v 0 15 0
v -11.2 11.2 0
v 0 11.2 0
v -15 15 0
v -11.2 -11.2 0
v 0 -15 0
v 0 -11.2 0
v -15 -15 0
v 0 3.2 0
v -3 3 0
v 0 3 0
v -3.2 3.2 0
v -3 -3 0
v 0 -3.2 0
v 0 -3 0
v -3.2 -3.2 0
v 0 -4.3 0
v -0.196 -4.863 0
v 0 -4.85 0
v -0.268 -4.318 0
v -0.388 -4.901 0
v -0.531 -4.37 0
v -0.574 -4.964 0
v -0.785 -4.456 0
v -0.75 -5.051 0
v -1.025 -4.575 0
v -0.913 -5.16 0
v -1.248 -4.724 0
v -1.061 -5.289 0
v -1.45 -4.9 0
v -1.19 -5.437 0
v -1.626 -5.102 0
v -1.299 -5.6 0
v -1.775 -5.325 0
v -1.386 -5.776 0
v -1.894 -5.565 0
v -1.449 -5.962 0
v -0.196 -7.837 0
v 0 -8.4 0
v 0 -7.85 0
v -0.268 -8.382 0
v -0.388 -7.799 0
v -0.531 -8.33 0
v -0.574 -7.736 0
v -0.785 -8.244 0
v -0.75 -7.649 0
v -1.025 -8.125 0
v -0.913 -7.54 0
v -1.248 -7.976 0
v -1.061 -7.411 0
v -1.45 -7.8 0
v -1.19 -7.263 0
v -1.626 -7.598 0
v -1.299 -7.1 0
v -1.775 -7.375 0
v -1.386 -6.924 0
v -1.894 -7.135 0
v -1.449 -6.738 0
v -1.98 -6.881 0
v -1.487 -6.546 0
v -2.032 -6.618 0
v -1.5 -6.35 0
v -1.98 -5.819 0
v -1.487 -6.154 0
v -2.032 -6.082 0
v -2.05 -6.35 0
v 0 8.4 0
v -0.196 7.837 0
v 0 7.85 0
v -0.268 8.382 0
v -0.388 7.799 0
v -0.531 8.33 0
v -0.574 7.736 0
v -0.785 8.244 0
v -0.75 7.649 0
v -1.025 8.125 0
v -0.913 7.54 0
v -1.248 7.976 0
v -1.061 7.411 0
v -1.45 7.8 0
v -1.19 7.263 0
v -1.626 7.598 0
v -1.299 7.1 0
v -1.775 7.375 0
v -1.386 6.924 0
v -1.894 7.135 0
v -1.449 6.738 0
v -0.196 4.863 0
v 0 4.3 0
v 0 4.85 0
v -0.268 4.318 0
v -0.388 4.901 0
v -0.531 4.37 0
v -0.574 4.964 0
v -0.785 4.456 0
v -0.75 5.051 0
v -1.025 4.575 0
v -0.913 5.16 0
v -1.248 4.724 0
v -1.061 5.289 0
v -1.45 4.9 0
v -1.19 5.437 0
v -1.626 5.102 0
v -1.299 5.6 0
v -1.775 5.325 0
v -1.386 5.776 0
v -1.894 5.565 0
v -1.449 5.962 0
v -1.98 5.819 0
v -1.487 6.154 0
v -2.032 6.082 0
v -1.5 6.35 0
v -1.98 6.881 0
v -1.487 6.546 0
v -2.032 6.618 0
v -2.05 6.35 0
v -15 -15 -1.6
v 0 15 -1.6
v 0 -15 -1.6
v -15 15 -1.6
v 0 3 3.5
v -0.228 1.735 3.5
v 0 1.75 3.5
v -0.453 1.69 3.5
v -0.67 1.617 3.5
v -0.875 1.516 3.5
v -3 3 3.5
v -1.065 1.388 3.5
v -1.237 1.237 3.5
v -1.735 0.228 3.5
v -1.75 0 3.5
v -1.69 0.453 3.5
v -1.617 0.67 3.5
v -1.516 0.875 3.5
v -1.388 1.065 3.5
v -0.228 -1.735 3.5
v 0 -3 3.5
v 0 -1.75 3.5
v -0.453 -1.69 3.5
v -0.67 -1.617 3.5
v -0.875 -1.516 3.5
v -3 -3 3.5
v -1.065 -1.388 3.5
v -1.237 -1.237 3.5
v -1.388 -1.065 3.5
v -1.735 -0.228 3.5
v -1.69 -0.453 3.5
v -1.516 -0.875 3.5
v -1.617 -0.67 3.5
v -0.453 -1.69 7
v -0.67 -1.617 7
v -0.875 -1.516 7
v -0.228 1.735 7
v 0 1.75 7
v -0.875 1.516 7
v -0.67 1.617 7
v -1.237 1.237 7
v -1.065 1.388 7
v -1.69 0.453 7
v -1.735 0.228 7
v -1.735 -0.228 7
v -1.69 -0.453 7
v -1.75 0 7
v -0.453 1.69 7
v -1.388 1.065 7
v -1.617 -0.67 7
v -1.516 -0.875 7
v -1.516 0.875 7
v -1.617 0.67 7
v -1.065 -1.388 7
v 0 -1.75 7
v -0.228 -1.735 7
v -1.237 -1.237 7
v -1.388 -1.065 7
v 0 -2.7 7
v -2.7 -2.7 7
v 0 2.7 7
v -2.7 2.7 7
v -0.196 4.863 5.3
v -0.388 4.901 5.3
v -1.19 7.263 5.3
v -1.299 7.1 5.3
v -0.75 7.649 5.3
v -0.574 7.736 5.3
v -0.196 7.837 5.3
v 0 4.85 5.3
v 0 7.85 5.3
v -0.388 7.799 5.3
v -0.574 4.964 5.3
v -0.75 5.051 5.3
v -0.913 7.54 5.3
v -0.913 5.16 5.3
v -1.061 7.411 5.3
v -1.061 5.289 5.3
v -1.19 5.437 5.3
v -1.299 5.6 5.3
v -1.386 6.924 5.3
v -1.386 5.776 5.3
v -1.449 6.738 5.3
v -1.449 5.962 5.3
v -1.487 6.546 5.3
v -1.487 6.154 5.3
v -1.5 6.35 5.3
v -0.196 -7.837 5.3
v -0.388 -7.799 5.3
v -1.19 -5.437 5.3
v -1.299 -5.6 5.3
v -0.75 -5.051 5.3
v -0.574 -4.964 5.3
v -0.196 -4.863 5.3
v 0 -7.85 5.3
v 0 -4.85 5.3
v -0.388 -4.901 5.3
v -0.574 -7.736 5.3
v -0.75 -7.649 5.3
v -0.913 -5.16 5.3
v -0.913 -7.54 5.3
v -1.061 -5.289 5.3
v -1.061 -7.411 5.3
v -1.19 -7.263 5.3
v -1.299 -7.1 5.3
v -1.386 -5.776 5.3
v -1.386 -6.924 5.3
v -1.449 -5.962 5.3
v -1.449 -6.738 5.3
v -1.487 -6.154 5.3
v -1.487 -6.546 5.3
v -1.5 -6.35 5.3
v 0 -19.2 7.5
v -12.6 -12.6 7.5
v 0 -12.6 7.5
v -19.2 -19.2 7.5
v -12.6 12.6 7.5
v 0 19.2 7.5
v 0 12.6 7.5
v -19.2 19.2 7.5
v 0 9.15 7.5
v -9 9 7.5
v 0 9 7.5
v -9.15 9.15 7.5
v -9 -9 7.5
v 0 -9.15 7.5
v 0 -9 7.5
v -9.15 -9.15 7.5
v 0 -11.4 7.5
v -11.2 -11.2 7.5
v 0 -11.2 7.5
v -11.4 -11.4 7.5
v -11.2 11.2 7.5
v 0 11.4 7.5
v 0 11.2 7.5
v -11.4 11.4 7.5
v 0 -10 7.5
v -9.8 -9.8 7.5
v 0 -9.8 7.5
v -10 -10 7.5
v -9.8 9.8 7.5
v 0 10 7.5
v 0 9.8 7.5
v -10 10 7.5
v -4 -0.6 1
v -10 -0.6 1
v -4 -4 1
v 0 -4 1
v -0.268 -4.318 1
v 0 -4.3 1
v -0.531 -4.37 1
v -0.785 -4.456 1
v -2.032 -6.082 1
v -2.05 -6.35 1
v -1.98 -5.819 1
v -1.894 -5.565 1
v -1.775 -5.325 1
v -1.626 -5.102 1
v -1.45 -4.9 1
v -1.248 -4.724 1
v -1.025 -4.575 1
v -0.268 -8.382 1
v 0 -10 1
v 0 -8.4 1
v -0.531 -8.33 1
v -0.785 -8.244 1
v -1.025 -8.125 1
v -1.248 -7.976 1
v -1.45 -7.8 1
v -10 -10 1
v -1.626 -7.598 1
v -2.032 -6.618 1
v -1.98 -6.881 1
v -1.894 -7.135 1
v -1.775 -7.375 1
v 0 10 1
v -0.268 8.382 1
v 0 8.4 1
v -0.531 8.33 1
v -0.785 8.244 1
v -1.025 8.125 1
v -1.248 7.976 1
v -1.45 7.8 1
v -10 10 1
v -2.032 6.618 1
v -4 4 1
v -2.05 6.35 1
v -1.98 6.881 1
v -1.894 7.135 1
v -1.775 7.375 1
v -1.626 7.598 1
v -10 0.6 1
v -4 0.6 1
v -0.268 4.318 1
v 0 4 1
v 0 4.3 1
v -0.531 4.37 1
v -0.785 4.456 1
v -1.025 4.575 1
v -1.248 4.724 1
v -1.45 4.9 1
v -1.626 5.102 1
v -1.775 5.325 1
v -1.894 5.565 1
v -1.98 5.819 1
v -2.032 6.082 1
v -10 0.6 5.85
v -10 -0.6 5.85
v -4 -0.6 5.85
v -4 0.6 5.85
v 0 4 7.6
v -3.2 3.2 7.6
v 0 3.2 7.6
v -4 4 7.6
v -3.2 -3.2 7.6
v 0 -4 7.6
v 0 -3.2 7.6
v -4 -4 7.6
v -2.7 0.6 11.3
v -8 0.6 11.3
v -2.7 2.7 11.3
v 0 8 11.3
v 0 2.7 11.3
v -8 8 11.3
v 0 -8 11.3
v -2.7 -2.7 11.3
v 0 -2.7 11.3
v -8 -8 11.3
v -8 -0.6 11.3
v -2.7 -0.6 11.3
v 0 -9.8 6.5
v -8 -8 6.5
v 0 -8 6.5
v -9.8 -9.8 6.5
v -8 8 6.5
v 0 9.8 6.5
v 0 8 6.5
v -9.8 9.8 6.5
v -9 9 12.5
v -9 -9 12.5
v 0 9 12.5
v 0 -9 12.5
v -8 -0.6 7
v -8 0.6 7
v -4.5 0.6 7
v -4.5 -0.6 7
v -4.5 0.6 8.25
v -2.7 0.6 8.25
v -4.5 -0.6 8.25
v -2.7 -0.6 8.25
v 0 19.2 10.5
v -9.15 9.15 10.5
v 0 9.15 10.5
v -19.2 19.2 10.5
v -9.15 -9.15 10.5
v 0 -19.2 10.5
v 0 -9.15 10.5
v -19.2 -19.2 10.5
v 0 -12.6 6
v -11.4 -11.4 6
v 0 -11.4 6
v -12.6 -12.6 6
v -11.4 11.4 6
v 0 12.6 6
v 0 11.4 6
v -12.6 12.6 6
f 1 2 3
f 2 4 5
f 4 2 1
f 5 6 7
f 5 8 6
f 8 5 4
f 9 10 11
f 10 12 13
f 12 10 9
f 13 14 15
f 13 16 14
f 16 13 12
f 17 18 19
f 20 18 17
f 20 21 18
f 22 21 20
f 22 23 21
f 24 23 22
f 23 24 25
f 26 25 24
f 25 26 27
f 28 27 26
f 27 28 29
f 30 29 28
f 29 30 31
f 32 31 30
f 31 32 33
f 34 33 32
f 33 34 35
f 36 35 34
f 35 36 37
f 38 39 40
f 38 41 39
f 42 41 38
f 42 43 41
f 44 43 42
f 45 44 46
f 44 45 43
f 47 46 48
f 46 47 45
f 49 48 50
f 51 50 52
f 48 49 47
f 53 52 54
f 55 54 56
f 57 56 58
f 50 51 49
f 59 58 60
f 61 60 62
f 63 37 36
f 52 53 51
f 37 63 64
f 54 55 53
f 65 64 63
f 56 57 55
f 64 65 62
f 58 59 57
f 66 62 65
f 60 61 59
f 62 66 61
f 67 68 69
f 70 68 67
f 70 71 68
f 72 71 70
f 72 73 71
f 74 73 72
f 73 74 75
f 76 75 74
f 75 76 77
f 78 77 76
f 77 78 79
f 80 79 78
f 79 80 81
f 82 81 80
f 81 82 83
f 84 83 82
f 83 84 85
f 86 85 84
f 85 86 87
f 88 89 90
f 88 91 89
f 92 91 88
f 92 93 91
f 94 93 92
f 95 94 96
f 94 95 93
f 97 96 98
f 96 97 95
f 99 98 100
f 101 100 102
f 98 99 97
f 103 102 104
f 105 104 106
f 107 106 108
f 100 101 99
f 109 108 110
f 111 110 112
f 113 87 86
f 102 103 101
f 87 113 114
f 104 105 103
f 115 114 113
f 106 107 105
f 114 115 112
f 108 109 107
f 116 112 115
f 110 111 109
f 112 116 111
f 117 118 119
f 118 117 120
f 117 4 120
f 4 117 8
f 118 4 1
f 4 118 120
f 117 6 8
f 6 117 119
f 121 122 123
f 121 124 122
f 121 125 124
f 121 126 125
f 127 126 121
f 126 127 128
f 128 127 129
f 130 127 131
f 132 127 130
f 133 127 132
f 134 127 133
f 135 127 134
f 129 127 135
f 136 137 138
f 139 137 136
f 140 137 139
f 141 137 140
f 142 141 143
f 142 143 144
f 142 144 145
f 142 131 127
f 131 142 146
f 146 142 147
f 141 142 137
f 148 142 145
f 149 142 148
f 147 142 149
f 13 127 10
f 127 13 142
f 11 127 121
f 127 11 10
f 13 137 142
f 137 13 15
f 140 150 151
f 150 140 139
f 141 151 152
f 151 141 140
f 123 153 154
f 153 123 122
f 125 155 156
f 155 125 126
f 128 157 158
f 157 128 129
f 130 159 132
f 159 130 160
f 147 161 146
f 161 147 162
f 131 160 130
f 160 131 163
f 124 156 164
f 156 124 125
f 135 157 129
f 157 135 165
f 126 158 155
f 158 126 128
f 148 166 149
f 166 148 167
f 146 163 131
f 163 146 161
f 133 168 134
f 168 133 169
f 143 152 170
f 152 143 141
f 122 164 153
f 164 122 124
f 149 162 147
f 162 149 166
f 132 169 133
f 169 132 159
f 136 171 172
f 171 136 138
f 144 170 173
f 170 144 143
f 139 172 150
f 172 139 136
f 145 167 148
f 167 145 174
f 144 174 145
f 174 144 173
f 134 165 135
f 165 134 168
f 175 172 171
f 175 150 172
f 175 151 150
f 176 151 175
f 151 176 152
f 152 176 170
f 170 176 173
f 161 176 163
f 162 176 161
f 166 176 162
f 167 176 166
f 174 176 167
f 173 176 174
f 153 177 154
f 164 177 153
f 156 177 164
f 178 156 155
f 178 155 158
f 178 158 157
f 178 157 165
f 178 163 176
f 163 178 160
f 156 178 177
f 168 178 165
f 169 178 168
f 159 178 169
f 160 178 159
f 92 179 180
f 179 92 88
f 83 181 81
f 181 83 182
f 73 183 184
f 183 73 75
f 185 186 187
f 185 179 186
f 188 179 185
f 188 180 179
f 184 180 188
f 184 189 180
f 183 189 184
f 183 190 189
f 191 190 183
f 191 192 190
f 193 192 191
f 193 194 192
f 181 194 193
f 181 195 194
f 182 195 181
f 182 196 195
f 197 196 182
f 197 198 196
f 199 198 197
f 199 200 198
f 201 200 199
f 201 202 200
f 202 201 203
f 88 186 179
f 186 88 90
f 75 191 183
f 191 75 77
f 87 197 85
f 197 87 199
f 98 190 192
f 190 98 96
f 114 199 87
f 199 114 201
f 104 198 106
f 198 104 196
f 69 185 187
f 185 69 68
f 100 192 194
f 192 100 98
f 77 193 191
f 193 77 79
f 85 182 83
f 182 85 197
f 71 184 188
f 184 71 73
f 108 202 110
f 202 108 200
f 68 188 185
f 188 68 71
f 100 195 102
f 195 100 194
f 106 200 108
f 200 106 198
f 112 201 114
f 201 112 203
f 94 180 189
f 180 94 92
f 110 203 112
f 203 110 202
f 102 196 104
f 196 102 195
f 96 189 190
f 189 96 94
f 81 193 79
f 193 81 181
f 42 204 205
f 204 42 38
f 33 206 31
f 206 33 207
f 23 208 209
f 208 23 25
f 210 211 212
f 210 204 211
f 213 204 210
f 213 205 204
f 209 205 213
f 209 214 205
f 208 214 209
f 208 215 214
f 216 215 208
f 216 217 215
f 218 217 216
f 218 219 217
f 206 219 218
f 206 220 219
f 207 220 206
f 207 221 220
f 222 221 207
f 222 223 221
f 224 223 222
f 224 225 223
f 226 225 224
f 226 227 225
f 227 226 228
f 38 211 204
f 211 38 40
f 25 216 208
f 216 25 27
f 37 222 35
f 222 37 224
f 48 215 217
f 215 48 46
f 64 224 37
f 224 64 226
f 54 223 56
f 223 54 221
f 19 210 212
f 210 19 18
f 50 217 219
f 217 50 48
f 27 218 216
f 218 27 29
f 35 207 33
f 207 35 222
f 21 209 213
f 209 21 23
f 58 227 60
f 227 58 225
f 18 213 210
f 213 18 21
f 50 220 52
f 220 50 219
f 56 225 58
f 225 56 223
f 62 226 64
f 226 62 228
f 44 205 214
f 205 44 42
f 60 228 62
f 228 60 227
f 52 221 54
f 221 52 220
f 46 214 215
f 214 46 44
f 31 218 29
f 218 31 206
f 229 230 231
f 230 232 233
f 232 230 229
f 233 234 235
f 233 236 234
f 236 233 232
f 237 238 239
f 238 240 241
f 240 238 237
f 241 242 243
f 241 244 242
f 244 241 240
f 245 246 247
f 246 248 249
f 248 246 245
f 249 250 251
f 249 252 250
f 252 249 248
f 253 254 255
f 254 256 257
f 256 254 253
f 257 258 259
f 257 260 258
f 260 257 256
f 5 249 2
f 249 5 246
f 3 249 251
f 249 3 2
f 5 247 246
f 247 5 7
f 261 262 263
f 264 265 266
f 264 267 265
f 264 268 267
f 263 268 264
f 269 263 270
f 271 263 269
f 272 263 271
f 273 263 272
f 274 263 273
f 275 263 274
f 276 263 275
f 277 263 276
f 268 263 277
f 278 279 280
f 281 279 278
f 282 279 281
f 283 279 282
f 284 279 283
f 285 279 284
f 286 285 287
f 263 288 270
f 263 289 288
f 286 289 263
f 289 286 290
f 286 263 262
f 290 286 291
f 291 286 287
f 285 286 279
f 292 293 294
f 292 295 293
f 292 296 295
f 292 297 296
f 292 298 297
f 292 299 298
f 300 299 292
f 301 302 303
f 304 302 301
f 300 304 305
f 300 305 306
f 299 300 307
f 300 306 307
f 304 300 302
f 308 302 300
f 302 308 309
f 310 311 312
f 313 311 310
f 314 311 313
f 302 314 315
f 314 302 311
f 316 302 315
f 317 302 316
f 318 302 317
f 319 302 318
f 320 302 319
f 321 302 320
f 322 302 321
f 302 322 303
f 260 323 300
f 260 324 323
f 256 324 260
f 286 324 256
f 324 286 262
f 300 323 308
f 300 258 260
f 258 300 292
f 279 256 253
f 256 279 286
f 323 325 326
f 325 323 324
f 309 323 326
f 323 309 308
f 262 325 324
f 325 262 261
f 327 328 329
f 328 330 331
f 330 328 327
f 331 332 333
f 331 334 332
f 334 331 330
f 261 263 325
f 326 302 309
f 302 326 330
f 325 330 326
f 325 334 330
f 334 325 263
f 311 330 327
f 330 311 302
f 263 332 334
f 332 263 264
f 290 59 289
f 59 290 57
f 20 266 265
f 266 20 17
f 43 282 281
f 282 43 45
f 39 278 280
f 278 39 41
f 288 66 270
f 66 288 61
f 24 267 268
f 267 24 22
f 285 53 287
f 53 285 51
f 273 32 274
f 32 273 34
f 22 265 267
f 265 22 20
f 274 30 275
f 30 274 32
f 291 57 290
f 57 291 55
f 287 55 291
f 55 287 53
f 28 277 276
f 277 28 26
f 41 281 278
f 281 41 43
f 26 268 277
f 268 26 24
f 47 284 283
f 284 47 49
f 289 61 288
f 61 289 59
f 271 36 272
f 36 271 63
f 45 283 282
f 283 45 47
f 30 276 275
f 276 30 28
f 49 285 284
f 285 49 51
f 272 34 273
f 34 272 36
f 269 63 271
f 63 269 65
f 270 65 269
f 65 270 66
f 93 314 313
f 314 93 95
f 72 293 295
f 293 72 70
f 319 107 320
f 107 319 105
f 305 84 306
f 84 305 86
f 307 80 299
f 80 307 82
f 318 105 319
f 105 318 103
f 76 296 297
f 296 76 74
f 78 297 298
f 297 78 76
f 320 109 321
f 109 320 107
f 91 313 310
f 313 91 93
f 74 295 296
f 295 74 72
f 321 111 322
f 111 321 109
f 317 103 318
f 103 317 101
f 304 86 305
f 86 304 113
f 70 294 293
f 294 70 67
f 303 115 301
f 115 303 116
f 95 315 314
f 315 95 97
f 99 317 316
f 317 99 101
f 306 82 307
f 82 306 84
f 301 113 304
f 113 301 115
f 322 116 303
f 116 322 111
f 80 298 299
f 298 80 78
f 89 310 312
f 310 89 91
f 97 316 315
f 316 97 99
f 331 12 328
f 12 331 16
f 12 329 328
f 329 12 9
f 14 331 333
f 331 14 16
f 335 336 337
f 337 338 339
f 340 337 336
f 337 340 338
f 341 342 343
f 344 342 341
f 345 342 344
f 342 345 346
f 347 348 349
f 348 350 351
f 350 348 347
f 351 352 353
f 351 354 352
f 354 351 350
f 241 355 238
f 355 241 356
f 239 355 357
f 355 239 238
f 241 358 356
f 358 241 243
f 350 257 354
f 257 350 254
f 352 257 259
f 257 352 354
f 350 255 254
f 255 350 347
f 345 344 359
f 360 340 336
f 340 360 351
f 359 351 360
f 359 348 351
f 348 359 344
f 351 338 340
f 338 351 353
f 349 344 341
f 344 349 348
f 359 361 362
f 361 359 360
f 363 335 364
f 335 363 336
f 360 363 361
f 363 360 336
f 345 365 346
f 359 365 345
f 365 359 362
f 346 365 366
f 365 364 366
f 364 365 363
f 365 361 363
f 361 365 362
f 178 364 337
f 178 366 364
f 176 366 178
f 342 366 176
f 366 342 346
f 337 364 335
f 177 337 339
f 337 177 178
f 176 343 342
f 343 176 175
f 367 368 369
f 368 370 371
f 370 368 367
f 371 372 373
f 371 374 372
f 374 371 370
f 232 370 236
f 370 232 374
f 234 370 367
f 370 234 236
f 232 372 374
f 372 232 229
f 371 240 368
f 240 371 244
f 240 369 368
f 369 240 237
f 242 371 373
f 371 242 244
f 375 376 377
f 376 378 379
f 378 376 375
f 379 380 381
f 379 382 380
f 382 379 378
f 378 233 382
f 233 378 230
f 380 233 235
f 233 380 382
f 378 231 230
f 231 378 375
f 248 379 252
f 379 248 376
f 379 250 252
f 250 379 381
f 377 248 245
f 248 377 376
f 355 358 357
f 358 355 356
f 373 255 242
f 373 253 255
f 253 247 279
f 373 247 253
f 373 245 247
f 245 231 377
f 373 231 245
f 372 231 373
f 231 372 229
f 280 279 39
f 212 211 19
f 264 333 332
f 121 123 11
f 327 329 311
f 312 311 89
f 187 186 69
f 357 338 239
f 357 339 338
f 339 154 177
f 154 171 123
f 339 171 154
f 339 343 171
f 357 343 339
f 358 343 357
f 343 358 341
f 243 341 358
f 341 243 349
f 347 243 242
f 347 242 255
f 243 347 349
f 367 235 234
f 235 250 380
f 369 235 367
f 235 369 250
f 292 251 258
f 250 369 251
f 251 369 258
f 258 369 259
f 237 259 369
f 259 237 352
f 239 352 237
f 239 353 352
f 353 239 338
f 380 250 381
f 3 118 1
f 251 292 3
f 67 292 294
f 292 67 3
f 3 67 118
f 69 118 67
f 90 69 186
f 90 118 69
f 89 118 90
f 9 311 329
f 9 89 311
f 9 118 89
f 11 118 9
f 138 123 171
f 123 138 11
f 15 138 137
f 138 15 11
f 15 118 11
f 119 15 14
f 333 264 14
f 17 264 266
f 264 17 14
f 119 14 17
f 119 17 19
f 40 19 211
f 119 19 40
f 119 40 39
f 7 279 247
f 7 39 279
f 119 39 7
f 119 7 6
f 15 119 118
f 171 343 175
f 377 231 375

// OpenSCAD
// Parametric DIY Korry-style pushbutton
//   1 x 6x6 mm THT tactile switch (centre)
//   2 x 3 mm THT LEDs (upper zone / lower zone)
//   printed holder (sits on PCB) + printed cap (slides through panel hole)
//
// Stack, z = 0 at PCB top surface:
//   PCB -> holder (light chambers, switch collar) -> panel back
//   cap flange is trapped between holder sleeve and panel back,
//   tactile switch dome pushes the cap back up.
//
// Render one part at a time:  openscad -D 'part="cap"' -o cap.stl korry.scad
// part = "cap" | "holder" | "coupon" | "assembly" | "section"

part = "section";

/* ---------- parameters you will tune ---------- */
cap_w        = 18.0;   // visible cap face, square
cap_clear    = 0.15;   // per side, cap <-> panel hole
protrude     = 2.0;    // cap face above panel front at rest
panel_t      = 3.0;    // front panel thickness
face_t       = 1.2;    // translucent face (print in white/natural)
wall         = 1.0;    // cap skirt wall
flange       = 0.8;    // flange width beyond skirt (stops cap)
flange_t     = 1.0;
divider_t    = 1.2;

sw_body      = 6.0;    // tactile switch body (square)
sw_body_h    = 3.5;    // body height above PCB
sw_h         = 7.0;    // plunger top above PCB (buy 6x6x7)
sw_travel    = 0.25;   // datasheet travel
plunger_gap  = 0.0;    // + = gap at rest (rattle), - = preload. Print -0.1/0/+0.1 and pick

led_d        = 3.0;
led_flange_d = 3.9;
led_y        = 6.35;   // 2.5 x 0.1" from centre -> perfboard friendly
diffuse_gap  = 6.0;    // min distance LED top -> face underside (even glow)
led_h        = 5.3;    // 3 mm LED height above PCB

holder_base  = 1.0;
holder_wall  = 1.2;
fit          = 0.2;    // generic sliding clearance

$fn = 48;

/* ---------- derived ---------- */
skirt_w   = cap_w;                       // skirt = face size, passes through panel hole
flange_w  = cap_w + 2*flange;
hole_w    = cap_w + 2*cap_clear;         // panel hole
sleeve_in = flange_w + 2*fit;
holder_w  = sleeve_in + 2*holder_wall;

face_under = max(led_h + diffuse_gap, 0);  // z of face underside at rest
cap_top    = face_under + face_t;
panel_front= cap_top - protrude;
panel_back = panel_front - panel_t;        // == holder height == flange top at rest
cap_bottom = panel_back - flange_t;        // skirt / flange bottom
piston_w   = sw_body - 0.6;                // presses plunger, runs inside collar
piston_bot = sw_h + plunger_gap;
collar_in  = sw_body + 2*fit;
collar_out = collar_in + 2*0.8;          // 2 perimeters @ 0.4 nozzle
collar_top = piston_bot + 0.6;             // piston dips 0.6 into collar = light labyrinth
holder_div_top = min(piston_bot, cap_bottom) - sw_travel - 0.4; // below cap skirt + divider when pressed
notch_z    = collar_top + sw_travel + 0.4; // divider relief above collar

assert(holder_div_top > led_h - 2, "holder divider too low to separate LEDs - raise diffuse_gap");
assert(notch_z < face_under - 1, "divider relief reaches the face - raise diffuse_gap");
assert(led_y - led_flange_d/2 > collar_out/2 + 0.2, "LED collides with switch collar");
assert(led_y + led_flange_d/2 < sleeve_in/2, "LED outside chamber");

echo(str("panel hole = ", hole_w, " mm square"));
echo(str("holder / standoff height (PCB top -> panel back) = ", panel_back, " mm"));
echo(str("cap total height = ", cap_top - cap_bottom, " mm"));

module sq(w, h, z=0) translate([-w/2, -w/2, z]) cube([w, w, h]);

/* ---------- CAP (print face-down: face in white/natural, rest black) ---------- */
module cap() {
    difference() {
        union() {
            sq(skirt_w, face_under - cap_bottom, cap_bottom); // skirt (face is separate body)
            sq(flange_w, flange_t, cap_bottom);              // flange
        }
        sq(skirt_w - 2*wall, face_under - cap_bottom + 0.01, cap_bottom - 0.01);
    }
    // divider (black) splits upper / lower legend zones
    difference() {
        translate([-skirt_w/2 + 0.01, -divider_t/2, piston_bot])
            cube([skirt_w - 0.02, divider_t, face_under - piston_bot + 0.01]);
        // relief over the switch collar
        translate([-collar_out/2 - 0.5, -divider_t, piston_bot - 0.1])
            cube([collar_out + 1, 2*divider_t, notch_z - piston_bot + 0.1]);
    }
    // piston: presses the plunger, nests in collar to block light crossing over
    sq(piston_w, face_under - piston_bot + 0.01, piston_bot);
}

/* ---------- FACE ONLY (separate body for AMS colour assignment) ---------- */
module cap_face() sq(skirt_w, face_t, face_under);

/* ---------- HOLDER (print black, sits on PCB) ---------- */
module holder() {
    difference() {
        union() {
            // sleeve
            difference() {
                sq(holder_w, panel_back);
                sq(sleeve_in, panel_back + 1, holder_base);
            }
            // switch collar
            sq(collar_out, collar_top);
            // horizontal light divider either side of the collar
            for (s = [-1, 1])
                translate([s > 0 ? collar_out/2 - 0.01 : -sleeve_in/2, -divider_t/2, 0])
                    cube([sleeve_in/2 - collar_out/2 + 0.01, divider_t, holder_div_top]);
        }
        // switch pocket (through)
        sq(collar_in, collar_top + 1, -0.5);
        // LED holes (flange sits on PCB)
        for (s = [-1, 1]) translate([0, s*led_y, -0.5]) cylinder(d = led_flange_d + fit, h = holder_base + 1);
    }
}

/* ---------- PANEL TEST COUPON (one hole, check fit + legend look) ---------- */
module coupon() {
    w = holder_w + 16;
    difference() {
        translate([-w/2, -w/2, panel_back]) cube([w, w, panel_t]);
        sq(hole_w, panel_t + 2, panel_back - 1);
    }
    // locating ridge for the holder on the panel back
    difference() {
        sq(holder_w + 2*1.2 + 2*fit, 1.5, panel_back - 1.5);
        sq(holder_w + 2*fit, 2, panel_back - 1.6);
    }
}

module pcb() color("darkgreen") translate([-15, -15, -1.6]) cube([30, 30, 1.6]);
module parts() {
    pcb();
    color("dimgray") sq(sw_body, sw_body_h);
    color("black") translate([0,0,sw_body_h]) cylinder(d = 3.5, h = sw_h - sw_body_h);
    color("orange") translate([0,  led_y, 0]) cylinder(d = led_d, h = led_h);
    color("white")  translate([0, -led_y, 0]) cylinder(d = led_d, h = led_h);
}
module assembly() {
    parts();
    color([0.15,0.15,0.15]) holder();
    color([0.1,0.1,0.1]) cap();
    color([0.95,0.95,0.9]) cap_face();
    color([0.45,0.5,0.55]) coupon();
}

if (part == "cap") { cap(); }
else if (part == "cap_face") cap_face();
else if (part == "holder") holder();
else if (part == "coupon") coupon();
else if (part == "assembly") assembly();
else if (part == "section") difference() { assembly(); translate([0, -50, -10]) cube([100, 100, 100]); }

module exploded() {
    parts();
    color([0.2,0.2,0.2]) translate([0,0,6]) holder();
    color([0.1,0.1,0.1]) translate([0,0,14]) cap();
    color([0.95,0.92,0.8]) translate([0,0,14]) cap_face();
    color([0.45,0.5,0.58]) translate([0,0,26]) coupon();
}
if (part == "exploded") exploded();
